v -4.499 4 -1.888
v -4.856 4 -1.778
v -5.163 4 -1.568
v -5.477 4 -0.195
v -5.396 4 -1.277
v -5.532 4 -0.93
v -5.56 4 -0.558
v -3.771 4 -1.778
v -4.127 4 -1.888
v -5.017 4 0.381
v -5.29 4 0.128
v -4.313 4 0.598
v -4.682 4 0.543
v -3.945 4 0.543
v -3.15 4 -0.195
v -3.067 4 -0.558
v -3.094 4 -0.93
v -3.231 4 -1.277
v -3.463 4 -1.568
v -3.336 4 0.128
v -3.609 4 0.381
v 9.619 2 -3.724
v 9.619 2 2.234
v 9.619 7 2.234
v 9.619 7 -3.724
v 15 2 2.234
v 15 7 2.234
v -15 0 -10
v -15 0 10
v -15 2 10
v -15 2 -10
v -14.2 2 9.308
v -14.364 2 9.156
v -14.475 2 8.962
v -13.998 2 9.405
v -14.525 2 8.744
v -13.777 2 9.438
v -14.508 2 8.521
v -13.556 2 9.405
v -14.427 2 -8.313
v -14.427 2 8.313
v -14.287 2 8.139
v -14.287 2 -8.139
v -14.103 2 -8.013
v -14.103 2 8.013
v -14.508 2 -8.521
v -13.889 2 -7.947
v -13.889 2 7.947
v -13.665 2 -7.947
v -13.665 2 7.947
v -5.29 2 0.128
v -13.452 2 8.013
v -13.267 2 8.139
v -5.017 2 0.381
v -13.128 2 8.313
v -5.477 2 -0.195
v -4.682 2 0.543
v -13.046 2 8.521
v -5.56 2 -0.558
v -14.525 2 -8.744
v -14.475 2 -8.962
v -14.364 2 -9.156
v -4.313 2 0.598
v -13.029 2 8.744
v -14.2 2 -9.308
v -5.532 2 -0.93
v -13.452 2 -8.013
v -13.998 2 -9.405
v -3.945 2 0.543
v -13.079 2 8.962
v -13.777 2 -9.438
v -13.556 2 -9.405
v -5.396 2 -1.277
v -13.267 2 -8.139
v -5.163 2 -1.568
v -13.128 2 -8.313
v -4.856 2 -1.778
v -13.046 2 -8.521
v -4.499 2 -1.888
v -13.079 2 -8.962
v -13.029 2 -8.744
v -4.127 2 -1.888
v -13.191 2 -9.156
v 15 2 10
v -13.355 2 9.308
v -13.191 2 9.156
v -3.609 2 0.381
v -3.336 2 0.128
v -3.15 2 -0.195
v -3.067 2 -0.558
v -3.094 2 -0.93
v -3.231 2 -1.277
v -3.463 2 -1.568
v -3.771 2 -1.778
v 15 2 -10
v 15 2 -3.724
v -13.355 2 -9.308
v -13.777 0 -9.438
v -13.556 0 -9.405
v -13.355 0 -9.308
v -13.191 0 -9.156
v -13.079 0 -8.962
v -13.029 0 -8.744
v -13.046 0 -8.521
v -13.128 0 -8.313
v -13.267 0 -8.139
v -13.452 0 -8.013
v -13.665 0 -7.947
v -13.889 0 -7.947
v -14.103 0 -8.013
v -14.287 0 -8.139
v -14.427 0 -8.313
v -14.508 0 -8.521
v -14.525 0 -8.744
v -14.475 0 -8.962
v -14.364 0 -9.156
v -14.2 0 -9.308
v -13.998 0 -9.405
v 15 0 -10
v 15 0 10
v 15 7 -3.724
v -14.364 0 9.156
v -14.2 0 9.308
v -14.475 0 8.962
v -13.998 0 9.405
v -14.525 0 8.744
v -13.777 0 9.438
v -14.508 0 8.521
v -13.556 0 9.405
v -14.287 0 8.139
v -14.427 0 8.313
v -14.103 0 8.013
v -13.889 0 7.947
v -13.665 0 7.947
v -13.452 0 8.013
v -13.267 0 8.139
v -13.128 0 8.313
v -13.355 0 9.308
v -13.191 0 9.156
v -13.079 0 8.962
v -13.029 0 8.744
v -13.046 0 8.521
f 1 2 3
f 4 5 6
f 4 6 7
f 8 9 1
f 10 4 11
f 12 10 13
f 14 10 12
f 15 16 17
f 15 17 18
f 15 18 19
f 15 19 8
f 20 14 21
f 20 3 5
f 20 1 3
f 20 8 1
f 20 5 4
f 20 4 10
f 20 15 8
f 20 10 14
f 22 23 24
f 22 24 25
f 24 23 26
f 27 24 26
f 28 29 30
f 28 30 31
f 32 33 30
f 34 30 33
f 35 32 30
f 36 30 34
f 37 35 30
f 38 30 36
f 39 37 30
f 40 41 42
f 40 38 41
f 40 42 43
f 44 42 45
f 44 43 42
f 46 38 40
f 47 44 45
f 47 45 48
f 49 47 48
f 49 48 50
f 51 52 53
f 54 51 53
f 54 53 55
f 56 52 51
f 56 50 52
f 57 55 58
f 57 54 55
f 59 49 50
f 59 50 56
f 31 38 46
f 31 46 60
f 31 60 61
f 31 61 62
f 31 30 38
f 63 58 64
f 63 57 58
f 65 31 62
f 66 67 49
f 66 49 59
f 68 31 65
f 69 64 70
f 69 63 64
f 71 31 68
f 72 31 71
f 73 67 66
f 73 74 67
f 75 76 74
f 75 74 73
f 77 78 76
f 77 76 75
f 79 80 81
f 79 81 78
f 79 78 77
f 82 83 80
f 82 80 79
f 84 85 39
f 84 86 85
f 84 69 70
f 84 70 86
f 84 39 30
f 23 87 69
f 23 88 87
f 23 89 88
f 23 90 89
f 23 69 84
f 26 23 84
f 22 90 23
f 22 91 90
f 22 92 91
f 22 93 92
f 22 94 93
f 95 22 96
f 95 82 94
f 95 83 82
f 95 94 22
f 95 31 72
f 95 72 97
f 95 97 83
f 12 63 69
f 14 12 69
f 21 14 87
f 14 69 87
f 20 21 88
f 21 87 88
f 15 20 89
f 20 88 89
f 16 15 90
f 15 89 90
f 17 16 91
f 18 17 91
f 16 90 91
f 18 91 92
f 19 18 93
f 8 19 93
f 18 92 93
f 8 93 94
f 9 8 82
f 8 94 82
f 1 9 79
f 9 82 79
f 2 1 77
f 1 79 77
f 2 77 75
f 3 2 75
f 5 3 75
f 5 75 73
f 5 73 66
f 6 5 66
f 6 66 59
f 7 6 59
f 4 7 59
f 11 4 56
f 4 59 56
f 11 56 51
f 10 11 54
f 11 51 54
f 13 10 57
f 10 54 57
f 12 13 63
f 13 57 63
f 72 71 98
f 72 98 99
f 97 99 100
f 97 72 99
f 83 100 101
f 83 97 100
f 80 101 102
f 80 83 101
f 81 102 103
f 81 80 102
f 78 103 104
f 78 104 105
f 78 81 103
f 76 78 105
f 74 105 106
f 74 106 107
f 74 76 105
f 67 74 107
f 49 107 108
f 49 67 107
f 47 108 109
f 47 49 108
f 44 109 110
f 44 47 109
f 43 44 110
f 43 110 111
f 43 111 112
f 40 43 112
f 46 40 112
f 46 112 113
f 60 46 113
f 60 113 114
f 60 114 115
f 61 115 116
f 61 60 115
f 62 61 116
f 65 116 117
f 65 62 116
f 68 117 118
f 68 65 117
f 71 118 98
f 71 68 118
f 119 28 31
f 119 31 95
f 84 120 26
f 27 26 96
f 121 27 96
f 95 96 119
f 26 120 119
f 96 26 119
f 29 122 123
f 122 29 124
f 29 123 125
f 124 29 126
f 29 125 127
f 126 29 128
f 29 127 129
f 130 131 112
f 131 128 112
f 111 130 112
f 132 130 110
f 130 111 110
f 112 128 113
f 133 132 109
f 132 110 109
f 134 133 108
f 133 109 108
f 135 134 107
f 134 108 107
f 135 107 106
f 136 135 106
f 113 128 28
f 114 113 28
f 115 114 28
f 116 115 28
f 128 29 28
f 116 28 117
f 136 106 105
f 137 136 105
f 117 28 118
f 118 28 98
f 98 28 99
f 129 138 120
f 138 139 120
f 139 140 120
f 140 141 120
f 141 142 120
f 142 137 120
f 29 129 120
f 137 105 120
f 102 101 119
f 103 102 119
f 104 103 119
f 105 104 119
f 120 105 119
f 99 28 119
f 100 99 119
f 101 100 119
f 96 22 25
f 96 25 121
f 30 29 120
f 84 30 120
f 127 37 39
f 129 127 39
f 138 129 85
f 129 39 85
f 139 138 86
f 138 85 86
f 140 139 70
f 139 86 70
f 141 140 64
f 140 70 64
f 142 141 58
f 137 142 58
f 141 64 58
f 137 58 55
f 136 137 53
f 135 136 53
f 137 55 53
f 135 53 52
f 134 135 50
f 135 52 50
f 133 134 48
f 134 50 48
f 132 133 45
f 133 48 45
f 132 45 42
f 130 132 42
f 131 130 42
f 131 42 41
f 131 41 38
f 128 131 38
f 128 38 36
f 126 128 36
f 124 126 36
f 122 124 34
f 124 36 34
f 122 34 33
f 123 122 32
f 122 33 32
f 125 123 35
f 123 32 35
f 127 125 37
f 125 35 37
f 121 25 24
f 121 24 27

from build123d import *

# Parameters (mm, degrees)
ESQUISSE1_W             = 30
ESQUISSE1_H             = 20
BOSS_EXTRU_1_DEPTH      = 2
ESQUISSE2_R             = 0.75
ENL_V_MAT_EXTRU_1_DEPTH = 2
ESQUISSE3_R             = 1.25
BOSS_EXTRU_2_DEPTH      = 2
ESQUISSE4_W             = 5.380750915
ESQUISSE4_H             = 5.957728466
BOSS_EXTRU_3_DEPTH      = 5


with BuildPart() as part:
    # Esquisse1 → Boss.-Extru.1 (new body)
    with BuildSketch(Plane(origin=(0, 0, 0), x_dir=(1, 0, 0), z_dir=(0, 1, 0))):
        Rectangle(ESQUISSE1_W, ESQUISSE1_H)
    extrude(amount=BOSS_EXTRU_1_DEPTH)

    # Esquisse2 → Enlèv. mat.-Extru.1 (cut)
    with BuildSketch(Plane(origin=(0, 2, 0), x_dir=(1, 0, 0), z_dir=(0, 1, 0))):
        with Locations(Location((-13.777247076, -8.688354012, 0), (0, 0, 270))):
            Circle(ESQUISSE2_R)
    enl_v_mat_extru_1 = extrude(amount=-ENL_V_MAT_EXTRU_1_DEPTH, mode=Mode.SUBTRACT)

    # Symétrie1: Enlèv. mat.-Extru.1 across plane
    add(enl_v_mat_extru_1.mirror(Plane.XY), mode=Mode.SUBTRACT)

    # Esquisse3 → Boss.-Extru.2 (add)
    with BuildSketch(Plane(origin=(0, 2, 0), x_dir=(1, 0, 0), z_dir=(0, 1, 0))):
        with Locations(Location((-4.31314717, 0.651626551, 0), (0, 0, 270))):
            Circle(ESQUISSE3_R)
    extrude(amount=BOSS_EXTRU_2_DEPTH)

    # Esquisse4 → Boss.-Extru.3 (add)
    with BuildSketch(Plane(origin=(0, 2, 0), x_dir=(1, 0, 0), z_dir=(0, 1, 0))):
        with Locations((12.309624542, 0.744716058)):
            Rectangle(ESQUISSE4_W, ESQUISSE4_H)
    extrude(amount=BOSS_EXTRU_3_DEPTH)


solid = part.part
